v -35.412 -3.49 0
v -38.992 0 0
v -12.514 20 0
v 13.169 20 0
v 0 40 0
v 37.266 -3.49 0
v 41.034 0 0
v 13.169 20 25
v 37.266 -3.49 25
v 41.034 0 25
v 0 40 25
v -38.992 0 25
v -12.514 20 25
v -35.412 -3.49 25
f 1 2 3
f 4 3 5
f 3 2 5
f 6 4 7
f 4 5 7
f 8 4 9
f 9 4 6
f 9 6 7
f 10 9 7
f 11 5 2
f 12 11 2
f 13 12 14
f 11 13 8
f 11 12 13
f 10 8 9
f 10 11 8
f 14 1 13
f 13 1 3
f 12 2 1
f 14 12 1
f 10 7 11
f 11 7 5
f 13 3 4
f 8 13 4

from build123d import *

# Parameters (mm, degrees)
F1_DEPTH = 25


with BuildPart() as f1:
    # F0 (on Top) → F1 (new body)
    with BuildSketch(Plane.XY):
        Polygon((0, 40), (-38.992442, 0), (-35.412103, -3.490154), (-12.513641, 20), (0, 32.836992), (13.168698, 20), (37.265833, -3.490154), (41.033594, 0), align=None)
        Polygon((0, 32.836992), (-12.513641, 20), (13.168698, 20), align=None)
    extrude(amount=F1_DEPTH)


solid = f1.part
